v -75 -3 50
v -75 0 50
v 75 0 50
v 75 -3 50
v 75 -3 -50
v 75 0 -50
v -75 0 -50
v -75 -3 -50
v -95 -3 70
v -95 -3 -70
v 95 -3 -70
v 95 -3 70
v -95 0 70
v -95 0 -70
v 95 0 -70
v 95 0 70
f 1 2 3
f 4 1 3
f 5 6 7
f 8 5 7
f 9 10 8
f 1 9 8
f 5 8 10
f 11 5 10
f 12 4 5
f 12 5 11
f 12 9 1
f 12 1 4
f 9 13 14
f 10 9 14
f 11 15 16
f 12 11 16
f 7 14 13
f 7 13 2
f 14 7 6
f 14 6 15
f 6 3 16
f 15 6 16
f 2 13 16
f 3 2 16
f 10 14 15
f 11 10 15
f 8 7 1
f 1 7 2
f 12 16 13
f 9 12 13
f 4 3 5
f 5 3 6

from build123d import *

# Parameters (mm, degrees)
F1_DEPTH = 3


with BuildPart() as f1:
    # F0 (on Front) → F1 (new body)
    with BuildSketch(Plane.XZ):
        Polygon((-75, 50), (-95, 70), (-95, -70), (-75, -50), align=None)
        Polygon((95, 70), (-95, 70), (-75, 50), (75, 50), align=None)
        Polygon((95, -70), (95, 70), (75, 50), (75, -50), align=None)
        Polygon((-75, -50), (-95, -70), (95, -70), (75, -50), align=None)
    extrude(amount=F1_DEPTH)


solid = f1.part
